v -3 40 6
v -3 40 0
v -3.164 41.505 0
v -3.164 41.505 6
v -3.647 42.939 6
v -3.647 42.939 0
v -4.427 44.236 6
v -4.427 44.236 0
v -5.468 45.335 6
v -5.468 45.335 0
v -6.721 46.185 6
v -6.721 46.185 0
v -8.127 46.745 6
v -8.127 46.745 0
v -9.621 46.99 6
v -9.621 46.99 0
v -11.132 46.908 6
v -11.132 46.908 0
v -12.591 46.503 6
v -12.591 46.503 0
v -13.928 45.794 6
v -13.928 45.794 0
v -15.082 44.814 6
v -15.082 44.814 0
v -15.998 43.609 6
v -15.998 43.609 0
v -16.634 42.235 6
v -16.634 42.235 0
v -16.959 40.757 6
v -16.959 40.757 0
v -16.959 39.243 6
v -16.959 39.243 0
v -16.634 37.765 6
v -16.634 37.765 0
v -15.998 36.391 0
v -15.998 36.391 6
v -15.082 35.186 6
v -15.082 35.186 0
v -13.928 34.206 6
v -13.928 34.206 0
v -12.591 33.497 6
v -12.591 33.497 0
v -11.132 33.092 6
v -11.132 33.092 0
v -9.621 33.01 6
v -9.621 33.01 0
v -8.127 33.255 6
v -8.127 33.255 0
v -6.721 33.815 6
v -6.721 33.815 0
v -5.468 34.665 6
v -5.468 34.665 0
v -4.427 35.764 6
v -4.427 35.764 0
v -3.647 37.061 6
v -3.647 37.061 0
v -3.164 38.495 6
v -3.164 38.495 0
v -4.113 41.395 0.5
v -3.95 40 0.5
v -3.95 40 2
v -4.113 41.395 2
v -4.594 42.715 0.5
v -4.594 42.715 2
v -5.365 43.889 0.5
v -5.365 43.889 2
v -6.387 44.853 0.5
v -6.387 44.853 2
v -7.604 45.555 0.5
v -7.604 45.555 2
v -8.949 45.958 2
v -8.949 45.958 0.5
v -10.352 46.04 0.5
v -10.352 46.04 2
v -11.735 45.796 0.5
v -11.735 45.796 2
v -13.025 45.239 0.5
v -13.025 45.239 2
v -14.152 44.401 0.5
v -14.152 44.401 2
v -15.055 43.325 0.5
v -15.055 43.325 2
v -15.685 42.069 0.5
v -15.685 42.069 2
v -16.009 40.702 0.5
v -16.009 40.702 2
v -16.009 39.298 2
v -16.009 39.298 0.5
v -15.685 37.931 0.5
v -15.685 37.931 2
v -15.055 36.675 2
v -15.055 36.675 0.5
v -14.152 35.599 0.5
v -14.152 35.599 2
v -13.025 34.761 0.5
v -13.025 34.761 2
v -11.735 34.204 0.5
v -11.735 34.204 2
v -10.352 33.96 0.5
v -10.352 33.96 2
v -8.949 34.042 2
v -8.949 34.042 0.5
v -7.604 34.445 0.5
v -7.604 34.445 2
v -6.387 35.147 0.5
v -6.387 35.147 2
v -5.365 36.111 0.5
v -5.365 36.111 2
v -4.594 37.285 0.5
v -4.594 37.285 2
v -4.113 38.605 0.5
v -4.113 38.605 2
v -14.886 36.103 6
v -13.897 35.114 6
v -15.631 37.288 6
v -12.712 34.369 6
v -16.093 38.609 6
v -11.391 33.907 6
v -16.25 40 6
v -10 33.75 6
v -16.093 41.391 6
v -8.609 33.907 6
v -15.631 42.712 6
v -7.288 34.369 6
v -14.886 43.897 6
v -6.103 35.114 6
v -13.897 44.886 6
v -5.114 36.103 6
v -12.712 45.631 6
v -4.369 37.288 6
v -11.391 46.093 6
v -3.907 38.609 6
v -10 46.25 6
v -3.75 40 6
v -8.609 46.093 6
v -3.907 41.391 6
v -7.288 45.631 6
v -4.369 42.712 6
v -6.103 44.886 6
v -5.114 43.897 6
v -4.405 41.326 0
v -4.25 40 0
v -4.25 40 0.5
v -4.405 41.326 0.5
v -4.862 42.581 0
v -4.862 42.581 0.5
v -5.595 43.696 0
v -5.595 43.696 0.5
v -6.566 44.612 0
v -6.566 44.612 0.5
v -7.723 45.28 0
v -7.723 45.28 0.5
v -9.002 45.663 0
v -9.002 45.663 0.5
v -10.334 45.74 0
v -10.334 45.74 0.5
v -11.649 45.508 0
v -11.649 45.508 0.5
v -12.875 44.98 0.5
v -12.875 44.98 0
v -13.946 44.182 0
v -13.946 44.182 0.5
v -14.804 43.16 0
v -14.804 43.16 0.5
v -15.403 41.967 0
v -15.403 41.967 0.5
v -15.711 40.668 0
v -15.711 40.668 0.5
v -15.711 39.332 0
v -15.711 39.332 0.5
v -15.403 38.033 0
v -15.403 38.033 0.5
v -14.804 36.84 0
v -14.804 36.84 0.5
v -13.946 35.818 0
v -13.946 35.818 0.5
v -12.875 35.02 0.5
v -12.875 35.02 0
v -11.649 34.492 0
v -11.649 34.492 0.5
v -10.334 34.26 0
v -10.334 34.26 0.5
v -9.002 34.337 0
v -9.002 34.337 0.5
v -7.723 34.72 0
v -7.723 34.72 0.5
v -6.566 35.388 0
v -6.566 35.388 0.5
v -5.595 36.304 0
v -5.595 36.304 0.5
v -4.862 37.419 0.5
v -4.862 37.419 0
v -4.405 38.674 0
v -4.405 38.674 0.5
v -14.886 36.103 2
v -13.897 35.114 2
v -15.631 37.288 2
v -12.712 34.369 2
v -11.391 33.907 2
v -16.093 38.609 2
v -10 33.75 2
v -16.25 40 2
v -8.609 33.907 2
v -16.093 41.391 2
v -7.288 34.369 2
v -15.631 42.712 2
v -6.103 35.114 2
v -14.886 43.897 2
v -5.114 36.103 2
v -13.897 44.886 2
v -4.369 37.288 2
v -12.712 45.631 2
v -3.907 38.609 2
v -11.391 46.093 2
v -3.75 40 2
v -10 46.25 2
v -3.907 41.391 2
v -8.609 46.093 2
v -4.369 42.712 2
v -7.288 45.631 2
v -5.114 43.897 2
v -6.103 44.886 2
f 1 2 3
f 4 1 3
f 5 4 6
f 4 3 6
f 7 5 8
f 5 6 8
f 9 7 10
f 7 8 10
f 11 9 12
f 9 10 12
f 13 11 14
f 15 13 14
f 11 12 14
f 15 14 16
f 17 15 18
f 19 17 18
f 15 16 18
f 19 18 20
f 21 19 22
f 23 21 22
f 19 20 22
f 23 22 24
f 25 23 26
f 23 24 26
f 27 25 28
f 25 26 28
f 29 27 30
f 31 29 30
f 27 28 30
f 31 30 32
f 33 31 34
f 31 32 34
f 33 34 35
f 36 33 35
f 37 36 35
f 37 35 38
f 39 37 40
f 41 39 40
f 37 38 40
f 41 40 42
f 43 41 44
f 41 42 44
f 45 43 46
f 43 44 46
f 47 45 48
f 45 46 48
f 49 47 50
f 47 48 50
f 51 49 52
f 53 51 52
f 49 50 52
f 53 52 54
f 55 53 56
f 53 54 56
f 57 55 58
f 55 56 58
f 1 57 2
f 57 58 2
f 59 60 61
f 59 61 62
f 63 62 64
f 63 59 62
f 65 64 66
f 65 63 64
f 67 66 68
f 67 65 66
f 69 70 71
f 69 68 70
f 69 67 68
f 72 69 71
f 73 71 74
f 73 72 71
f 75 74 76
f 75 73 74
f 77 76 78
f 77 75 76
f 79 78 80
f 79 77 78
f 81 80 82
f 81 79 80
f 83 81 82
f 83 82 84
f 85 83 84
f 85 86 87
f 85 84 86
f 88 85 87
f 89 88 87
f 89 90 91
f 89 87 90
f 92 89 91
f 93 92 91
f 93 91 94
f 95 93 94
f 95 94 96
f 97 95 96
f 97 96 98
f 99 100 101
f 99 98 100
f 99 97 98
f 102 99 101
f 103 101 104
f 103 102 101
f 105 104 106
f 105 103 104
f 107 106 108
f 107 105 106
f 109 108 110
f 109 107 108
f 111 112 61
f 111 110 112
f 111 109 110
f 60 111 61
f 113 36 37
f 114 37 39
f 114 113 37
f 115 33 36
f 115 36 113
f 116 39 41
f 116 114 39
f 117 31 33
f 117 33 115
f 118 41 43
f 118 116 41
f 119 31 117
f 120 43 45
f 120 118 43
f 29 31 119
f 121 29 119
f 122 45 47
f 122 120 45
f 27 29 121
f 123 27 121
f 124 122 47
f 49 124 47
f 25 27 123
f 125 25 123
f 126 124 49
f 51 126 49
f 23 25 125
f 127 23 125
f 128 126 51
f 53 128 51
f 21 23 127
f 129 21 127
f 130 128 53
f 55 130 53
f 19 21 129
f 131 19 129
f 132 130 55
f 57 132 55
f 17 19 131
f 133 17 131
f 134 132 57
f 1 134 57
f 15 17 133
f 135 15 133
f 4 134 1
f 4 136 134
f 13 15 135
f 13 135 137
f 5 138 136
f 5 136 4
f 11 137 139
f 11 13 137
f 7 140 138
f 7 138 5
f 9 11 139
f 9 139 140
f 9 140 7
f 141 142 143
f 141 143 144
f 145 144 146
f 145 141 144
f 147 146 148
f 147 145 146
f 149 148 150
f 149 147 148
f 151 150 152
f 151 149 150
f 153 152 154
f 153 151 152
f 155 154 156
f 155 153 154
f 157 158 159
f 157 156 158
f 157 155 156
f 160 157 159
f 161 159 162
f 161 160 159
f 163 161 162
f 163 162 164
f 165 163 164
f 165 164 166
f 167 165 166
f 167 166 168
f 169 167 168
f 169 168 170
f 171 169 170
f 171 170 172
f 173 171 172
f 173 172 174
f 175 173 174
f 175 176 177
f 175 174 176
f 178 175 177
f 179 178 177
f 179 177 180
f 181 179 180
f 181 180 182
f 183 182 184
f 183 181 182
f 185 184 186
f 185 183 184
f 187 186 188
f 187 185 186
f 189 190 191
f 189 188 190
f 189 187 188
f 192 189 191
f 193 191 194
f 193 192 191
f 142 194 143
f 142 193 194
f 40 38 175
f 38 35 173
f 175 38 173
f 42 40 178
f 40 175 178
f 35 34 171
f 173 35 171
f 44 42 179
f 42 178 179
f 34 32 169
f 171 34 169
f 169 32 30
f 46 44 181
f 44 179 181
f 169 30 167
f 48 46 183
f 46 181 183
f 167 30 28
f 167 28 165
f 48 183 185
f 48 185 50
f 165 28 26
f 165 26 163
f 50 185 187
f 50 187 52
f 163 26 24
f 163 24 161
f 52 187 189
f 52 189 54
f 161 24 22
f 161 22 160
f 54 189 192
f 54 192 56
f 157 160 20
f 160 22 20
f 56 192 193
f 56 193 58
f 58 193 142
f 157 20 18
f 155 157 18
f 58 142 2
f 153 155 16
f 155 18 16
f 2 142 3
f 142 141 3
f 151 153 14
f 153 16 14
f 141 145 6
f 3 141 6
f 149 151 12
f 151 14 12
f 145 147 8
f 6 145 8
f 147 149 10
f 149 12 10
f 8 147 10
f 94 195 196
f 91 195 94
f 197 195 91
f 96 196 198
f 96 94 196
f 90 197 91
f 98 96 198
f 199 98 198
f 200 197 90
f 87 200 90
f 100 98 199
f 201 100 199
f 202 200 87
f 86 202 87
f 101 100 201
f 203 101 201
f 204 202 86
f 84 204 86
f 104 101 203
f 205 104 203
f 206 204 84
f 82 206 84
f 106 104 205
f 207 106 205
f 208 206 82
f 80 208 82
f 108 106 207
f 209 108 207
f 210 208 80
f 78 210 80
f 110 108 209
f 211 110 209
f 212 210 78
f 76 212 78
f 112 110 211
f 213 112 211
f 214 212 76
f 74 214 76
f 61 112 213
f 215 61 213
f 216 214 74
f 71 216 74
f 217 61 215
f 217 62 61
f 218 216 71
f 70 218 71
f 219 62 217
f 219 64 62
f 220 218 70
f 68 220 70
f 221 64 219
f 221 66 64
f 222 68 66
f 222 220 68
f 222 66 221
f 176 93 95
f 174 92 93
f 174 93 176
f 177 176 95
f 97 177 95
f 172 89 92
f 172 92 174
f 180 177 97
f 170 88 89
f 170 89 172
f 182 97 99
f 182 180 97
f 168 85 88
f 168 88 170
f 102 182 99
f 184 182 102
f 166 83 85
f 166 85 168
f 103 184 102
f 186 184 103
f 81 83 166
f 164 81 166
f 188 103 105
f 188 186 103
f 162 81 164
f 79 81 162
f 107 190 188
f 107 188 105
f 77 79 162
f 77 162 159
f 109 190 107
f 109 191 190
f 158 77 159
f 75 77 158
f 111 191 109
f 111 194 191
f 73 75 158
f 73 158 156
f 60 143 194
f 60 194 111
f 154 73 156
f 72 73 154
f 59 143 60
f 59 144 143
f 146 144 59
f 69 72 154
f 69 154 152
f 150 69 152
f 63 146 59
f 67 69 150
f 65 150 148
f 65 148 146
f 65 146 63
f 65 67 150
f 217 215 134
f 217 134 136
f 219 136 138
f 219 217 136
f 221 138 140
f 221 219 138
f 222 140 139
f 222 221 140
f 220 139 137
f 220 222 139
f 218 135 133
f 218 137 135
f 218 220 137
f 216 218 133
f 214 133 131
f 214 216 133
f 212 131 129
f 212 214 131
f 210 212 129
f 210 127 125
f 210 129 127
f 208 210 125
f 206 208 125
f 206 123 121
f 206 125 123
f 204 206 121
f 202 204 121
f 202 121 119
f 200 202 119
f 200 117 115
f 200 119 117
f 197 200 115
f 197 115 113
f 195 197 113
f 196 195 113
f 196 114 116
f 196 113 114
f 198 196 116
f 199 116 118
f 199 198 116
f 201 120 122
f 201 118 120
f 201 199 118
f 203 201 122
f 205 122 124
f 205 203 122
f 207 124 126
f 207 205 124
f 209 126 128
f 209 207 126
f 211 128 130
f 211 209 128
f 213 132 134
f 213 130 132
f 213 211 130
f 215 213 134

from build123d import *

# Parameters (mm, degrees)
CYLINDER011_R     = 6.25
CYLINDER011_DEPTH = 10
CYLINDER010_R     = 6.05
CYLINDER010_DEPTH = 10
CYLINDER009_R     = 5.75
CYLINDER009_DEPTH = 10
CYLINDER008_R     = 7
CYLINDER008_DEPTH = 6


with BuildPart() as bluetmp06:
    # Cylinder011 → Cylinder011 (new body)
    with BuildSketch(Plane.XY.offset(2)):
        Circle(CYLINDER011_R)
    extrude(amount=CYLINDER011_DEPTH)


with BuildPart() as bluetmp04:
    # Cylinder010 → Cylinder010 (new body)
    with BuildSketch(Plane.XY.offset(0.5)):
        Circle(CYLINDER010_R)
    extrude(amount=CYLINDER010_DEPTH)


with BuildPart() as bluetmp02:
    # Cylinder009 → Cylinder009 (new body)
    with BuildSketch(Plane.XY):
        Circle(CYLINDER009_R)
    extrude(amount=CYLINDER009_DEPTH)


with BuildPart() as blueholder:
    # Cylinder008 → Cylinder008 (new body)
    with BuildSketch(Plane.XY):
        Circle(CYLINDER008_R)
    extrude(amount=CYLINDER008_DEPTH)

    # Cut005: cut BlueTmp02
    add(bluetmp02.part, mode=Mode.SUBTRACT)

    # Cut006: cut BlueTmp04
    add(bluetmp04.part, mode=Mode.SUBTRACT)

    # Cut007: cut BlueTmp06
    add(bluetmp06.part, mode=Mode.SUBTRACT)


with BuildPart() as blueholder_1:
    # Cut007 placement: moved
    add(blueholder.part.moved(Location((-10, 40, 0))))


solid = blueholder_1.part
